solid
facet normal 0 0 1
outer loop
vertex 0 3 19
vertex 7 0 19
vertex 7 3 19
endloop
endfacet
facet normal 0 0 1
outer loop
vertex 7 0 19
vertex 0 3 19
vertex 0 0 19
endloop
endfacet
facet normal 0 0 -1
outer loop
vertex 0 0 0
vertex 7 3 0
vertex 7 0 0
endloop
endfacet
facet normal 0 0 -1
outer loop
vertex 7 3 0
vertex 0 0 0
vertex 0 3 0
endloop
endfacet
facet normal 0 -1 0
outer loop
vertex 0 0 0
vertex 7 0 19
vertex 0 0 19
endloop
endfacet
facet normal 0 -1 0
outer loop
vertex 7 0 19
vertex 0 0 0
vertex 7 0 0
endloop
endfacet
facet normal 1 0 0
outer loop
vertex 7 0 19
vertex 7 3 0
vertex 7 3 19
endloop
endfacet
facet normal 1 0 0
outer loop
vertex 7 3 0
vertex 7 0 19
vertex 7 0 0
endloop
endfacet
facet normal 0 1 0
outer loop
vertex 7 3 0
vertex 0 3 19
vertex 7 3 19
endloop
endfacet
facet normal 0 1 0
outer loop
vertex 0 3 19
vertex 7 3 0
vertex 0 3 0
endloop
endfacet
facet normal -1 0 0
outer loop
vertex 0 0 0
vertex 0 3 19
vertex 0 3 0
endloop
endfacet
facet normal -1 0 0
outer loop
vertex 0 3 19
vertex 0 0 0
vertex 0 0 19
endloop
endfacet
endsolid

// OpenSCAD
// Generated by SolidPython 1.0.1 on 2020-07-29 00:46:55


cube(size = [7, 3, 19]);
/***********************************************
*********      SolidPython code:      **********
************************************************
 
# import packages: SolidPython
from solid import *
from solid.utils import *
from itertools import chain, combinations, permutations


class Resize:

    def __init__(self, scad_file):
        self.scad_file = scad_file
        #self.scad_file = import_scad(scad_file)
        # cone/cylinder param:
        self.r1 = 0
        self.r2 = 0
        self.h = 0
        # rectangular prism param:
        self.w = 0
        self.l = 0
        # ellipse param:
        self.r = 0

    # import OpenScad code (file name corresponds to shape)


    # classify shape + parameters
    def assign(self, param1, param2, param3):
        if self.scad_file == 'cone.scad':
            self.r1 = param1
            self.r2 = param2
            self.h = param3
        elif self.scad_file == 'cylinder.scad':
            self.r1 = param1
            self.r2 = param2
            self.h = param3
        elif self.scad_file == 'rectangularPrism.scad':
            self.h = param1
            self.l = param2
            self.w = param3
        else:
            self.r = param1
            self.h = param2

    # resize parameters
    def iterate(self):
        x = range(3, 20, 2)
        i = 1
        if self.scad_file == 'cone.scad':
            tempList = list(permutations(x, 2))
            for temp in tempList:
                param1 = temp[0]
                param2 = temp[1]
                filepath = 'produced_scad_files/' + 'cone' + str(param1) + '_' + str(param2) + '_' + '.scad'
                scad_render_to_file(cylinder(h=param1, r1=param2, r2=0), filepath)

        elif self.scad_file == 'cylinder.scad':
            tempList = list(permutations(x, 3))
            for temp in tempList:
                param1 = temp[0]
                param2 = temp[1]
                filepath = 'produced_scad_files/' + 'cylinder' + str(param1) + '_' + str(param2) + '_' + '.scad'
                scad_render_to_file(cylinder(h=param1, r1=param2, r2=param2), filepath)

        elif self.scad_file == 'rectangularPrism.scad':
            tempList = list(permutations(x, 3))
            for temp in tempList:
                param1 = temp[0]
                param2 = temp[1]
                param3 = temp[2]
                filepath = 'produced_scad_files/' + 'rectangularPrism' + str(param1) + '_' + str(param2) + '_' + str(
                    param3) + '.scad'
                scad_render_to_file(cube(size=(param1, param2, param3)), filepath)

        elif self.scad_file == 'ellipse.scad':
            tempList = list(permutations(x, 4))
            for temp in tempList:
                param1 = temp[0]
                param2 = temp[1]
                param3 = temp[2]
                param4 = temp[3]
                filepath = 'produced_scad_files/' + 'ellipse' + str(param1) + '_' + str(param2) + '_' + str(param3) + '_' + str(param4) + '.scad'
                scad_render_to_file(scale([param1, param2, param3])(sphere(r=param4)), filepath)

    def render_to_scadfile(self):
        scad_render_to_file(scad, 'example.scad') 
 
************************************************/
